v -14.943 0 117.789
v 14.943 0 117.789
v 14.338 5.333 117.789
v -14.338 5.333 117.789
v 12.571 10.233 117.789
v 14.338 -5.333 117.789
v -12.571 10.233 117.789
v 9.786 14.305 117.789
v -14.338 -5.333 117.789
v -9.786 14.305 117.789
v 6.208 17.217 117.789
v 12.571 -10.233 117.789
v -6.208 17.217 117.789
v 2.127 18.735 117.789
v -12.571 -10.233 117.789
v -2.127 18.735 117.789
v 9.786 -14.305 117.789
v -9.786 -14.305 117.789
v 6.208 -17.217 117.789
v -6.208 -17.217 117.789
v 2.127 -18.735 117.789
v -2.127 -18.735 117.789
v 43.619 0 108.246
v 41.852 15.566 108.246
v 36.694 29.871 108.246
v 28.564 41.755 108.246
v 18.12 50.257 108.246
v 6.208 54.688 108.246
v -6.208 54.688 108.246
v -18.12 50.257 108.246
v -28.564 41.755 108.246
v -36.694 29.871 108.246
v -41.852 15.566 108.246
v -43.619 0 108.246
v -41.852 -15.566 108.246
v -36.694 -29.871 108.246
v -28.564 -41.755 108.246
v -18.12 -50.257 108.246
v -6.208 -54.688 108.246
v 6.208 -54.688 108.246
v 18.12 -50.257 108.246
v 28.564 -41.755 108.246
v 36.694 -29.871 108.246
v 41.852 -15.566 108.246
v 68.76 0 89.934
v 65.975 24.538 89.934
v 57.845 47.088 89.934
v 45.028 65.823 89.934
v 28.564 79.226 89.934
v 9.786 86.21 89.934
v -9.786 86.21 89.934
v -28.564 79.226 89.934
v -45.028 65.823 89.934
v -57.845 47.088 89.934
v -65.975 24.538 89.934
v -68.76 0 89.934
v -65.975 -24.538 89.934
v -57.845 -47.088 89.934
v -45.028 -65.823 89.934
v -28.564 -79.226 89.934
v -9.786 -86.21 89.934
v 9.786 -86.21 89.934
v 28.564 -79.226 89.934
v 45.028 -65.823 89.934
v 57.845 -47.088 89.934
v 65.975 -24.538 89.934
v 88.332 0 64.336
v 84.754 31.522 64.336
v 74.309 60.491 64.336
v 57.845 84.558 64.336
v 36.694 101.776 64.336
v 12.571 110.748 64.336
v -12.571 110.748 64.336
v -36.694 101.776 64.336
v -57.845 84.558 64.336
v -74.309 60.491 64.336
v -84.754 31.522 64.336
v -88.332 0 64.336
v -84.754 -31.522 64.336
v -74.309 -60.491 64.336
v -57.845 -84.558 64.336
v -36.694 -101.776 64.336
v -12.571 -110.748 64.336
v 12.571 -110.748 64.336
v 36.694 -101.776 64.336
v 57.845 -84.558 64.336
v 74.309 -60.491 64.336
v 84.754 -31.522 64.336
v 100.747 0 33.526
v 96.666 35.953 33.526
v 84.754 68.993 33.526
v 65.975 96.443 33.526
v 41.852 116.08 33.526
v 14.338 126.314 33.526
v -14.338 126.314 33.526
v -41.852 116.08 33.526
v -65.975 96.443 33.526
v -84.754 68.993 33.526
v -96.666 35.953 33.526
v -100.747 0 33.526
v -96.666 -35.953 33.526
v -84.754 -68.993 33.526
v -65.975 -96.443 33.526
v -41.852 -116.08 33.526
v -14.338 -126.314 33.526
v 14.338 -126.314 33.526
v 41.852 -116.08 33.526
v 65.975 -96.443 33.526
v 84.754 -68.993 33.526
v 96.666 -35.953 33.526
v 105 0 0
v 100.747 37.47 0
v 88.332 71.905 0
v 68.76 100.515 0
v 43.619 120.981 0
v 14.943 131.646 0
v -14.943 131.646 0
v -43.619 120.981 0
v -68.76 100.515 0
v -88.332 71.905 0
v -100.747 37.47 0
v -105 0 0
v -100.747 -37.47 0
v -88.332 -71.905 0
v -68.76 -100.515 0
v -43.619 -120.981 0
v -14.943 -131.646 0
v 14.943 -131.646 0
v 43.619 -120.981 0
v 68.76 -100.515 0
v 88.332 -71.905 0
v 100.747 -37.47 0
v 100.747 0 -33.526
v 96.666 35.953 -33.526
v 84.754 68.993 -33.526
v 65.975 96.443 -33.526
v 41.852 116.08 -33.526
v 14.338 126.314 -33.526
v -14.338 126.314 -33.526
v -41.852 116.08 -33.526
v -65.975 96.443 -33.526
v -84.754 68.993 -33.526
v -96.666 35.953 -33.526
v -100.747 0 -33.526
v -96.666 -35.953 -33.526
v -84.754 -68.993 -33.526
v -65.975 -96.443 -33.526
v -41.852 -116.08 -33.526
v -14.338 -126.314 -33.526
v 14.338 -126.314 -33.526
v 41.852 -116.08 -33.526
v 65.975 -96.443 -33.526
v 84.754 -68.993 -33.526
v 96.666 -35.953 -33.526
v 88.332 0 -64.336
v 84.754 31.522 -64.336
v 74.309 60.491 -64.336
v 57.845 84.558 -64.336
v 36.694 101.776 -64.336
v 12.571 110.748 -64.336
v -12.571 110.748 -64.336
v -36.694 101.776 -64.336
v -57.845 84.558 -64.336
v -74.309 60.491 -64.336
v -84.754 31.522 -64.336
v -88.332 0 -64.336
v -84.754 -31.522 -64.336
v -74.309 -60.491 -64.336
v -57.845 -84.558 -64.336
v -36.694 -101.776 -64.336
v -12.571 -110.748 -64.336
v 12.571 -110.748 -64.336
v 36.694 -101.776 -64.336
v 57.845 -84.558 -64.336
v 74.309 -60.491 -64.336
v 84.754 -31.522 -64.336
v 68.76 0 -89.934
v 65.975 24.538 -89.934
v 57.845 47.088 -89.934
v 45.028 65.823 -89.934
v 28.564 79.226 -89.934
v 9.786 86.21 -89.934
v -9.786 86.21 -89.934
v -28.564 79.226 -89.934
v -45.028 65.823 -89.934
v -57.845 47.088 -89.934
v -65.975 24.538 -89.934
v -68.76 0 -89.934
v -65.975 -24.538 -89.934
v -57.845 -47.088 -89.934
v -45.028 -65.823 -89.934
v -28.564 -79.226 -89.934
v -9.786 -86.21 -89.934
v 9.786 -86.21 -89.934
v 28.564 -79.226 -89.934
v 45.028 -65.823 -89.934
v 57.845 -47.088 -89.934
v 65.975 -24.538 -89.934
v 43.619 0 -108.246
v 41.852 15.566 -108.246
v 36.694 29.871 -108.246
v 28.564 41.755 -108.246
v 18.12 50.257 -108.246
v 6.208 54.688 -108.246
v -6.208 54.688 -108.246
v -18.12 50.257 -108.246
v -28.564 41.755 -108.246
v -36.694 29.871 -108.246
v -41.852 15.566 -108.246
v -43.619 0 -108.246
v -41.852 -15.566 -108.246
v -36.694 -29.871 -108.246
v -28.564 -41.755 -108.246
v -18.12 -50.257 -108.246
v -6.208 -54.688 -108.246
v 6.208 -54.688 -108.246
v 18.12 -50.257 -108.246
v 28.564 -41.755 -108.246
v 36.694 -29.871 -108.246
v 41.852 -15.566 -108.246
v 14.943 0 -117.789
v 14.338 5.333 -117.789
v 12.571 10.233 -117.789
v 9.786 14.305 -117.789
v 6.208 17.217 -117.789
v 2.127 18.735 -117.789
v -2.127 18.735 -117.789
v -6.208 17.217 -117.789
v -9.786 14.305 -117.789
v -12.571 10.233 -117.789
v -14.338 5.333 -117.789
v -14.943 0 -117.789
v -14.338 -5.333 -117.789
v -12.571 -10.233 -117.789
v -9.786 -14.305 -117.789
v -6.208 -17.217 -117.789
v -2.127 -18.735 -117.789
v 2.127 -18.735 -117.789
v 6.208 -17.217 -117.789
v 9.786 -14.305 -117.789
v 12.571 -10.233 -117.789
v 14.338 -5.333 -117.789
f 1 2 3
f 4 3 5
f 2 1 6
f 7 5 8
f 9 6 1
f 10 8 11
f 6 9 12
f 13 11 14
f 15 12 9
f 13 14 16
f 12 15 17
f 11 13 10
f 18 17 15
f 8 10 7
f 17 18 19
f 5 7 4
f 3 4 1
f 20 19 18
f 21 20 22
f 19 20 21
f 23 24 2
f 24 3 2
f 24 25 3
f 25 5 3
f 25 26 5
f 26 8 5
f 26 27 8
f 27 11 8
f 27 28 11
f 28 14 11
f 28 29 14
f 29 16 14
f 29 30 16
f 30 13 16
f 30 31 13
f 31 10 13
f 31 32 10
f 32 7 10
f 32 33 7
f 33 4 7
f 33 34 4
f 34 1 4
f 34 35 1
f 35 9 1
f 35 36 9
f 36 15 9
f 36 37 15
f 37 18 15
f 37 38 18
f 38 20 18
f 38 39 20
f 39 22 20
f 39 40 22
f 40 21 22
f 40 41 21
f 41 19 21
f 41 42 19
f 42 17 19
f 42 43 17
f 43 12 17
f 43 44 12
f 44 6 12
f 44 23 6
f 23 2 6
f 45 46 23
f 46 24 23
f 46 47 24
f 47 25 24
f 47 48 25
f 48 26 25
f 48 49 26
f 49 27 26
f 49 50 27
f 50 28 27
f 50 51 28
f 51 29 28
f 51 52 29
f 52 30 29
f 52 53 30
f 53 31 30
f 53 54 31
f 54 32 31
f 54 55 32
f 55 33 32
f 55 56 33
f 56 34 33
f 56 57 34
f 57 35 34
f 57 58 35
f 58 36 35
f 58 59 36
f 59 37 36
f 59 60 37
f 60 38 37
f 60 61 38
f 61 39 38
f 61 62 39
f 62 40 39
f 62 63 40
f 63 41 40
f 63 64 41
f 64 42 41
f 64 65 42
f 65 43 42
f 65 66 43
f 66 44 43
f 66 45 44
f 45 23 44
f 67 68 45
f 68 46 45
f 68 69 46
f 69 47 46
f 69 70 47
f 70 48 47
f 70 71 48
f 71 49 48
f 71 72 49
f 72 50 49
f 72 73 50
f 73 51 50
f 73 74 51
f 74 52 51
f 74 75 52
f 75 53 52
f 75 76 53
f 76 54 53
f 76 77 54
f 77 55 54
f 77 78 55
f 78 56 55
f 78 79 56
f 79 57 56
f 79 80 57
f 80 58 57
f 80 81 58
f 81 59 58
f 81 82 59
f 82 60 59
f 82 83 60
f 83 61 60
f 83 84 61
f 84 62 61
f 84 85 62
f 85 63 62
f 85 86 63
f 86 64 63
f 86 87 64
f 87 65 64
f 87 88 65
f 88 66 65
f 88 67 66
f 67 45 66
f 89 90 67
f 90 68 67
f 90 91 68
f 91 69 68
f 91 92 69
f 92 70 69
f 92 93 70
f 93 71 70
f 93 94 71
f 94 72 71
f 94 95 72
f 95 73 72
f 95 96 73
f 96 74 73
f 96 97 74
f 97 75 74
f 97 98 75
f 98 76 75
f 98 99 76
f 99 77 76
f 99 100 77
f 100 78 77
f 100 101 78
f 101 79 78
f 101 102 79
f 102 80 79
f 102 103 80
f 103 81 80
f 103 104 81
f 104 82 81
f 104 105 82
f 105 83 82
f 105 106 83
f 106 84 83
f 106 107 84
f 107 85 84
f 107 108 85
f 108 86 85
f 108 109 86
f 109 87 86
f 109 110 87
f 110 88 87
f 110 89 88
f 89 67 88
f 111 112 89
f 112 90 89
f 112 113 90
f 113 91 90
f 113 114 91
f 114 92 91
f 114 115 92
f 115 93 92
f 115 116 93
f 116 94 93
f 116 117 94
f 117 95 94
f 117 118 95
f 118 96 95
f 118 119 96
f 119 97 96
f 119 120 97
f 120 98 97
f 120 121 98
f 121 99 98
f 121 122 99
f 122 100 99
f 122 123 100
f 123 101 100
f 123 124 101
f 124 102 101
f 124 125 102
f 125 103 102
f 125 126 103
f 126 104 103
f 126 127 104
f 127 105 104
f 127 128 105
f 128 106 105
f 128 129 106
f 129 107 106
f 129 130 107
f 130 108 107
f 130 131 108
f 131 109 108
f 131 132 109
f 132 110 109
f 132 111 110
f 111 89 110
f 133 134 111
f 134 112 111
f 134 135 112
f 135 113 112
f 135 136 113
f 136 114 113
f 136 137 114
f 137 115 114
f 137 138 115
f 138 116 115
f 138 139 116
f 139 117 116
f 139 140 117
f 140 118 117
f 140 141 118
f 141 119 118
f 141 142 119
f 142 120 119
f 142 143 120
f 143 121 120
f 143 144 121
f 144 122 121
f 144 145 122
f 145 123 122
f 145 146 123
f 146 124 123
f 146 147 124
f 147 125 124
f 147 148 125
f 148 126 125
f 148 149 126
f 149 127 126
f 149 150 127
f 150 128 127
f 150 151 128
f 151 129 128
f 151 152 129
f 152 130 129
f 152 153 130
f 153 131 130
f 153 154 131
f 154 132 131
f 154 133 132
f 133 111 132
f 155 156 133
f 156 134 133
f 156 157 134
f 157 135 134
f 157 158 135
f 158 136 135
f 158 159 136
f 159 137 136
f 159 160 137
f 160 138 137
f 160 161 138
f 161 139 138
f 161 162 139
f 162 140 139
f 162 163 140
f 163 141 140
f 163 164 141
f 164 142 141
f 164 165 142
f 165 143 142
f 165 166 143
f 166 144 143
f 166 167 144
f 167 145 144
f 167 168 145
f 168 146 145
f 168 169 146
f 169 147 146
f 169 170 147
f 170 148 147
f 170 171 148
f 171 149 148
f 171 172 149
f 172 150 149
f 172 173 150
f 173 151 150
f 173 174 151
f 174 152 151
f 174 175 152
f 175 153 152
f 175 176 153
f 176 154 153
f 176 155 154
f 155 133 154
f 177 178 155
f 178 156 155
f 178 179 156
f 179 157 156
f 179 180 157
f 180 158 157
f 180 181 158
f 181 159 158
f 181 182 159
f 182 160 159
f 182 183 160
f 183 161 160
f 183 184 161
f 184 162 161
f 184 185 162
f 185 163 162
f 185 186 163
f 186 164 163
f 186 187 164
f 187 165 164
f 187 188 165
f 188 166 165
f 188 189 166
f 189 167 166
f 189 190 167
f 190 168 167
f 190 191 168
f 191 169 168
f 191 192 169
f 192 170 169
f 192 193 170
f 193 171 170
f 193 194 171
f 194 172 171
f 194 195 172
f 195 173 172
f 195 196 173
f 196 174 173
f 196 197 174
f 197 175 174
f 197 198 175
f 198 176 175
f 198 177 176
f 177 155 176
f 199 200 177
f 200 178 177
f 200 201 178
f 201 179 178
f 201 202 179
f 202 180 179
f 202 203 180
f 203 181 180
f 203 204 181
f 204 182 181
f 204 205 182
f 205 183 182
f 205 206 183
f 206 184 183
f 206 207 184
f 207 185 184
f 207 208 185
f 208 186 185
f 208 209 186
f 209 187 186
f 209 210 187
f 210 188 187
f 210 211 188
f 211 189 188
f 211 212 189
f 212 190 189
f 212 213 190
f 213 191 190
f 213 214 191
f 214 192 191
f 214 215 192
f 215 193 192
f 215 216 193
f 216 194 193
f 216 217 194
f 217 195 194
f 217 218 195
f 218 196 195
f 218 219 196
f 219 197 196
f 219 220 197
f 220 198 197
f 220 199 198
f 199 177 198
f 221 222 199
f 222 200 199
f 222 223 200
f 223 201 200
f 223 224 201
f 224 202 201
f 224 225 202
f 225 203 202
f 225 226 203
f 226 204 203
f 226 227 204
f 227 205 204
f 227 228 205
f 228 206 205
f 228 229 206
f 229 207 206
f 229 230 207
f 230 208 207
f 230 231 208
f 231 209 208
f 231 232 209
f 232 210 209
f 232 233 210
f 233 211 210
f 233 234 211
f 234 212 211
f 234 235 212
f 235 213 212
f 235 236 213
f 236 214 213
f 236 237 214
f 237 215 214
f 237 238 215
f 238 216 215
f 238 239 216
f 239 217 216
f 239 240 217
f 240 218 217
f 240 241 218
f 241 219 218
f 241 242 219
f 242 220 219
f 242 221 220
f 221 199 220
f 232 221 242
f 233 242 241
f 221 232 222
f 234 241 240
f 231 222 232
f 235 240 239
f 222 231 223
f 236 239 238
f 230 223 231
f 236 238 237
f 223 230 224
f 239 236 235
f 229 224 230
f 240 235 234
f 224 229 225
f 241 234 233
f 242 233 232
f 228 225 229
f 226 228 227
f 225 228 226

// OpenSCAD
// Generated by SolidPython 1.0.1 on 2020-07-29 00:46:52


scale(v = [15, 19, 17]) {
	sphere(r = 7);
}
/***********************************************
*********      SolidPython code:      **********
************************************************
 
# import packages: SolidPython
from solid import *
from solid.utils import *
from itertools import chain, combinations, permutations


class Resize:

    def __init__(self, scad_file):
        self.scad_file = scad_file
        #self.scad_file = import_scad(scad_file)
        # cone/cylinder param:
        self.r1 = 0
        self.r2 = 0
        self.h = 0
        # rectangular prism param:
        self.w = 0
        self.l = 0
        # ellipse param:
        self.r = 0

    # import OpenScad code (file name corresponds to shape)


    # classify shape + parameters
    def assign(self, param1, param2, param3):
        if self.scad_file == 'cone.scad':
            self.r1 = param1
            self.r2 = param2
            self.h = param3
        elif self.scad_file == 'cylinder.scad':
            self.r1 = param1
            self.r2 = param2
            self.h = param3
        elif self.scad_file == 'rectangularPrism.scad':
            self.h = param1
            self.l = param2
            self.w = param3
        else:
            self.r = param1
            self.h = param2

    # resize parameters
    def iterate(self):
        x = range(3, 20, 2)
        i = 1
        if self.scad_file == 'cone.scad':
            tempList = list(permutations(x, 2))
            for temp in tempList:
                param1 = temp[0]
                param2 = temp[1]
                filepath = 'produced_scad_files/' + 'cone' + str(param1) + '_' + str(param2) + '_' + '.scad'
                scad_render_to_file(cylinder(h=param1, r1=param2, r2=0), filepath)

        elif self.scad_file == 'cylinder.scad':
            tempList = list(permutations(x, 3))
            for temp in tempList:
                param1 = temp[0]
                param2 = temp[1]
                filepath = 'produced_scad_files/' + 'cylinder' + str(param1) + '_' + str(param2) + '_' + '.scad'
                scad_render_to_file(cylinder(h=param1, r1=param2, r2=param2), filepath)

        elif self.scad_file == 'rectangularPrism.scad':
            tempList = list(permutations(x, 3))
            for temp in tempList:
                param1 = temp[0]
                param2 = temp[1]
                param3 = temp[2]
                filepath = 'produced_scad_files/' + 'rectangularPrism' + str(param1) + '_' + str(param2) + '_' + str(
                    param3) + '.scad'
                scad_render_to_file(cube(size=(param1, param2, param3)), filepath)

        elif self.scad_file == 'ellipse.scad':
            tempList = list(permutations(x, 4))
            for temp in tempList:
                param1 = temp[0]
                param2 = temp[1]
                param3 = temp[2]
                param4 = temp[3]
                filepath = 'produced_scad_files/' + 'ellipse' + str(param1) + '_' + str(param2) + '_' + str(param3) + '_' + str(param4) + '.scad'
                scad_render_to_file(scale([param1, param2, param3])(sphere(r=param4)), filepath)

    def render_to_scadfile(self):
        scad_render_to_file(scad, 'example.scad') 
 
************************************************/
